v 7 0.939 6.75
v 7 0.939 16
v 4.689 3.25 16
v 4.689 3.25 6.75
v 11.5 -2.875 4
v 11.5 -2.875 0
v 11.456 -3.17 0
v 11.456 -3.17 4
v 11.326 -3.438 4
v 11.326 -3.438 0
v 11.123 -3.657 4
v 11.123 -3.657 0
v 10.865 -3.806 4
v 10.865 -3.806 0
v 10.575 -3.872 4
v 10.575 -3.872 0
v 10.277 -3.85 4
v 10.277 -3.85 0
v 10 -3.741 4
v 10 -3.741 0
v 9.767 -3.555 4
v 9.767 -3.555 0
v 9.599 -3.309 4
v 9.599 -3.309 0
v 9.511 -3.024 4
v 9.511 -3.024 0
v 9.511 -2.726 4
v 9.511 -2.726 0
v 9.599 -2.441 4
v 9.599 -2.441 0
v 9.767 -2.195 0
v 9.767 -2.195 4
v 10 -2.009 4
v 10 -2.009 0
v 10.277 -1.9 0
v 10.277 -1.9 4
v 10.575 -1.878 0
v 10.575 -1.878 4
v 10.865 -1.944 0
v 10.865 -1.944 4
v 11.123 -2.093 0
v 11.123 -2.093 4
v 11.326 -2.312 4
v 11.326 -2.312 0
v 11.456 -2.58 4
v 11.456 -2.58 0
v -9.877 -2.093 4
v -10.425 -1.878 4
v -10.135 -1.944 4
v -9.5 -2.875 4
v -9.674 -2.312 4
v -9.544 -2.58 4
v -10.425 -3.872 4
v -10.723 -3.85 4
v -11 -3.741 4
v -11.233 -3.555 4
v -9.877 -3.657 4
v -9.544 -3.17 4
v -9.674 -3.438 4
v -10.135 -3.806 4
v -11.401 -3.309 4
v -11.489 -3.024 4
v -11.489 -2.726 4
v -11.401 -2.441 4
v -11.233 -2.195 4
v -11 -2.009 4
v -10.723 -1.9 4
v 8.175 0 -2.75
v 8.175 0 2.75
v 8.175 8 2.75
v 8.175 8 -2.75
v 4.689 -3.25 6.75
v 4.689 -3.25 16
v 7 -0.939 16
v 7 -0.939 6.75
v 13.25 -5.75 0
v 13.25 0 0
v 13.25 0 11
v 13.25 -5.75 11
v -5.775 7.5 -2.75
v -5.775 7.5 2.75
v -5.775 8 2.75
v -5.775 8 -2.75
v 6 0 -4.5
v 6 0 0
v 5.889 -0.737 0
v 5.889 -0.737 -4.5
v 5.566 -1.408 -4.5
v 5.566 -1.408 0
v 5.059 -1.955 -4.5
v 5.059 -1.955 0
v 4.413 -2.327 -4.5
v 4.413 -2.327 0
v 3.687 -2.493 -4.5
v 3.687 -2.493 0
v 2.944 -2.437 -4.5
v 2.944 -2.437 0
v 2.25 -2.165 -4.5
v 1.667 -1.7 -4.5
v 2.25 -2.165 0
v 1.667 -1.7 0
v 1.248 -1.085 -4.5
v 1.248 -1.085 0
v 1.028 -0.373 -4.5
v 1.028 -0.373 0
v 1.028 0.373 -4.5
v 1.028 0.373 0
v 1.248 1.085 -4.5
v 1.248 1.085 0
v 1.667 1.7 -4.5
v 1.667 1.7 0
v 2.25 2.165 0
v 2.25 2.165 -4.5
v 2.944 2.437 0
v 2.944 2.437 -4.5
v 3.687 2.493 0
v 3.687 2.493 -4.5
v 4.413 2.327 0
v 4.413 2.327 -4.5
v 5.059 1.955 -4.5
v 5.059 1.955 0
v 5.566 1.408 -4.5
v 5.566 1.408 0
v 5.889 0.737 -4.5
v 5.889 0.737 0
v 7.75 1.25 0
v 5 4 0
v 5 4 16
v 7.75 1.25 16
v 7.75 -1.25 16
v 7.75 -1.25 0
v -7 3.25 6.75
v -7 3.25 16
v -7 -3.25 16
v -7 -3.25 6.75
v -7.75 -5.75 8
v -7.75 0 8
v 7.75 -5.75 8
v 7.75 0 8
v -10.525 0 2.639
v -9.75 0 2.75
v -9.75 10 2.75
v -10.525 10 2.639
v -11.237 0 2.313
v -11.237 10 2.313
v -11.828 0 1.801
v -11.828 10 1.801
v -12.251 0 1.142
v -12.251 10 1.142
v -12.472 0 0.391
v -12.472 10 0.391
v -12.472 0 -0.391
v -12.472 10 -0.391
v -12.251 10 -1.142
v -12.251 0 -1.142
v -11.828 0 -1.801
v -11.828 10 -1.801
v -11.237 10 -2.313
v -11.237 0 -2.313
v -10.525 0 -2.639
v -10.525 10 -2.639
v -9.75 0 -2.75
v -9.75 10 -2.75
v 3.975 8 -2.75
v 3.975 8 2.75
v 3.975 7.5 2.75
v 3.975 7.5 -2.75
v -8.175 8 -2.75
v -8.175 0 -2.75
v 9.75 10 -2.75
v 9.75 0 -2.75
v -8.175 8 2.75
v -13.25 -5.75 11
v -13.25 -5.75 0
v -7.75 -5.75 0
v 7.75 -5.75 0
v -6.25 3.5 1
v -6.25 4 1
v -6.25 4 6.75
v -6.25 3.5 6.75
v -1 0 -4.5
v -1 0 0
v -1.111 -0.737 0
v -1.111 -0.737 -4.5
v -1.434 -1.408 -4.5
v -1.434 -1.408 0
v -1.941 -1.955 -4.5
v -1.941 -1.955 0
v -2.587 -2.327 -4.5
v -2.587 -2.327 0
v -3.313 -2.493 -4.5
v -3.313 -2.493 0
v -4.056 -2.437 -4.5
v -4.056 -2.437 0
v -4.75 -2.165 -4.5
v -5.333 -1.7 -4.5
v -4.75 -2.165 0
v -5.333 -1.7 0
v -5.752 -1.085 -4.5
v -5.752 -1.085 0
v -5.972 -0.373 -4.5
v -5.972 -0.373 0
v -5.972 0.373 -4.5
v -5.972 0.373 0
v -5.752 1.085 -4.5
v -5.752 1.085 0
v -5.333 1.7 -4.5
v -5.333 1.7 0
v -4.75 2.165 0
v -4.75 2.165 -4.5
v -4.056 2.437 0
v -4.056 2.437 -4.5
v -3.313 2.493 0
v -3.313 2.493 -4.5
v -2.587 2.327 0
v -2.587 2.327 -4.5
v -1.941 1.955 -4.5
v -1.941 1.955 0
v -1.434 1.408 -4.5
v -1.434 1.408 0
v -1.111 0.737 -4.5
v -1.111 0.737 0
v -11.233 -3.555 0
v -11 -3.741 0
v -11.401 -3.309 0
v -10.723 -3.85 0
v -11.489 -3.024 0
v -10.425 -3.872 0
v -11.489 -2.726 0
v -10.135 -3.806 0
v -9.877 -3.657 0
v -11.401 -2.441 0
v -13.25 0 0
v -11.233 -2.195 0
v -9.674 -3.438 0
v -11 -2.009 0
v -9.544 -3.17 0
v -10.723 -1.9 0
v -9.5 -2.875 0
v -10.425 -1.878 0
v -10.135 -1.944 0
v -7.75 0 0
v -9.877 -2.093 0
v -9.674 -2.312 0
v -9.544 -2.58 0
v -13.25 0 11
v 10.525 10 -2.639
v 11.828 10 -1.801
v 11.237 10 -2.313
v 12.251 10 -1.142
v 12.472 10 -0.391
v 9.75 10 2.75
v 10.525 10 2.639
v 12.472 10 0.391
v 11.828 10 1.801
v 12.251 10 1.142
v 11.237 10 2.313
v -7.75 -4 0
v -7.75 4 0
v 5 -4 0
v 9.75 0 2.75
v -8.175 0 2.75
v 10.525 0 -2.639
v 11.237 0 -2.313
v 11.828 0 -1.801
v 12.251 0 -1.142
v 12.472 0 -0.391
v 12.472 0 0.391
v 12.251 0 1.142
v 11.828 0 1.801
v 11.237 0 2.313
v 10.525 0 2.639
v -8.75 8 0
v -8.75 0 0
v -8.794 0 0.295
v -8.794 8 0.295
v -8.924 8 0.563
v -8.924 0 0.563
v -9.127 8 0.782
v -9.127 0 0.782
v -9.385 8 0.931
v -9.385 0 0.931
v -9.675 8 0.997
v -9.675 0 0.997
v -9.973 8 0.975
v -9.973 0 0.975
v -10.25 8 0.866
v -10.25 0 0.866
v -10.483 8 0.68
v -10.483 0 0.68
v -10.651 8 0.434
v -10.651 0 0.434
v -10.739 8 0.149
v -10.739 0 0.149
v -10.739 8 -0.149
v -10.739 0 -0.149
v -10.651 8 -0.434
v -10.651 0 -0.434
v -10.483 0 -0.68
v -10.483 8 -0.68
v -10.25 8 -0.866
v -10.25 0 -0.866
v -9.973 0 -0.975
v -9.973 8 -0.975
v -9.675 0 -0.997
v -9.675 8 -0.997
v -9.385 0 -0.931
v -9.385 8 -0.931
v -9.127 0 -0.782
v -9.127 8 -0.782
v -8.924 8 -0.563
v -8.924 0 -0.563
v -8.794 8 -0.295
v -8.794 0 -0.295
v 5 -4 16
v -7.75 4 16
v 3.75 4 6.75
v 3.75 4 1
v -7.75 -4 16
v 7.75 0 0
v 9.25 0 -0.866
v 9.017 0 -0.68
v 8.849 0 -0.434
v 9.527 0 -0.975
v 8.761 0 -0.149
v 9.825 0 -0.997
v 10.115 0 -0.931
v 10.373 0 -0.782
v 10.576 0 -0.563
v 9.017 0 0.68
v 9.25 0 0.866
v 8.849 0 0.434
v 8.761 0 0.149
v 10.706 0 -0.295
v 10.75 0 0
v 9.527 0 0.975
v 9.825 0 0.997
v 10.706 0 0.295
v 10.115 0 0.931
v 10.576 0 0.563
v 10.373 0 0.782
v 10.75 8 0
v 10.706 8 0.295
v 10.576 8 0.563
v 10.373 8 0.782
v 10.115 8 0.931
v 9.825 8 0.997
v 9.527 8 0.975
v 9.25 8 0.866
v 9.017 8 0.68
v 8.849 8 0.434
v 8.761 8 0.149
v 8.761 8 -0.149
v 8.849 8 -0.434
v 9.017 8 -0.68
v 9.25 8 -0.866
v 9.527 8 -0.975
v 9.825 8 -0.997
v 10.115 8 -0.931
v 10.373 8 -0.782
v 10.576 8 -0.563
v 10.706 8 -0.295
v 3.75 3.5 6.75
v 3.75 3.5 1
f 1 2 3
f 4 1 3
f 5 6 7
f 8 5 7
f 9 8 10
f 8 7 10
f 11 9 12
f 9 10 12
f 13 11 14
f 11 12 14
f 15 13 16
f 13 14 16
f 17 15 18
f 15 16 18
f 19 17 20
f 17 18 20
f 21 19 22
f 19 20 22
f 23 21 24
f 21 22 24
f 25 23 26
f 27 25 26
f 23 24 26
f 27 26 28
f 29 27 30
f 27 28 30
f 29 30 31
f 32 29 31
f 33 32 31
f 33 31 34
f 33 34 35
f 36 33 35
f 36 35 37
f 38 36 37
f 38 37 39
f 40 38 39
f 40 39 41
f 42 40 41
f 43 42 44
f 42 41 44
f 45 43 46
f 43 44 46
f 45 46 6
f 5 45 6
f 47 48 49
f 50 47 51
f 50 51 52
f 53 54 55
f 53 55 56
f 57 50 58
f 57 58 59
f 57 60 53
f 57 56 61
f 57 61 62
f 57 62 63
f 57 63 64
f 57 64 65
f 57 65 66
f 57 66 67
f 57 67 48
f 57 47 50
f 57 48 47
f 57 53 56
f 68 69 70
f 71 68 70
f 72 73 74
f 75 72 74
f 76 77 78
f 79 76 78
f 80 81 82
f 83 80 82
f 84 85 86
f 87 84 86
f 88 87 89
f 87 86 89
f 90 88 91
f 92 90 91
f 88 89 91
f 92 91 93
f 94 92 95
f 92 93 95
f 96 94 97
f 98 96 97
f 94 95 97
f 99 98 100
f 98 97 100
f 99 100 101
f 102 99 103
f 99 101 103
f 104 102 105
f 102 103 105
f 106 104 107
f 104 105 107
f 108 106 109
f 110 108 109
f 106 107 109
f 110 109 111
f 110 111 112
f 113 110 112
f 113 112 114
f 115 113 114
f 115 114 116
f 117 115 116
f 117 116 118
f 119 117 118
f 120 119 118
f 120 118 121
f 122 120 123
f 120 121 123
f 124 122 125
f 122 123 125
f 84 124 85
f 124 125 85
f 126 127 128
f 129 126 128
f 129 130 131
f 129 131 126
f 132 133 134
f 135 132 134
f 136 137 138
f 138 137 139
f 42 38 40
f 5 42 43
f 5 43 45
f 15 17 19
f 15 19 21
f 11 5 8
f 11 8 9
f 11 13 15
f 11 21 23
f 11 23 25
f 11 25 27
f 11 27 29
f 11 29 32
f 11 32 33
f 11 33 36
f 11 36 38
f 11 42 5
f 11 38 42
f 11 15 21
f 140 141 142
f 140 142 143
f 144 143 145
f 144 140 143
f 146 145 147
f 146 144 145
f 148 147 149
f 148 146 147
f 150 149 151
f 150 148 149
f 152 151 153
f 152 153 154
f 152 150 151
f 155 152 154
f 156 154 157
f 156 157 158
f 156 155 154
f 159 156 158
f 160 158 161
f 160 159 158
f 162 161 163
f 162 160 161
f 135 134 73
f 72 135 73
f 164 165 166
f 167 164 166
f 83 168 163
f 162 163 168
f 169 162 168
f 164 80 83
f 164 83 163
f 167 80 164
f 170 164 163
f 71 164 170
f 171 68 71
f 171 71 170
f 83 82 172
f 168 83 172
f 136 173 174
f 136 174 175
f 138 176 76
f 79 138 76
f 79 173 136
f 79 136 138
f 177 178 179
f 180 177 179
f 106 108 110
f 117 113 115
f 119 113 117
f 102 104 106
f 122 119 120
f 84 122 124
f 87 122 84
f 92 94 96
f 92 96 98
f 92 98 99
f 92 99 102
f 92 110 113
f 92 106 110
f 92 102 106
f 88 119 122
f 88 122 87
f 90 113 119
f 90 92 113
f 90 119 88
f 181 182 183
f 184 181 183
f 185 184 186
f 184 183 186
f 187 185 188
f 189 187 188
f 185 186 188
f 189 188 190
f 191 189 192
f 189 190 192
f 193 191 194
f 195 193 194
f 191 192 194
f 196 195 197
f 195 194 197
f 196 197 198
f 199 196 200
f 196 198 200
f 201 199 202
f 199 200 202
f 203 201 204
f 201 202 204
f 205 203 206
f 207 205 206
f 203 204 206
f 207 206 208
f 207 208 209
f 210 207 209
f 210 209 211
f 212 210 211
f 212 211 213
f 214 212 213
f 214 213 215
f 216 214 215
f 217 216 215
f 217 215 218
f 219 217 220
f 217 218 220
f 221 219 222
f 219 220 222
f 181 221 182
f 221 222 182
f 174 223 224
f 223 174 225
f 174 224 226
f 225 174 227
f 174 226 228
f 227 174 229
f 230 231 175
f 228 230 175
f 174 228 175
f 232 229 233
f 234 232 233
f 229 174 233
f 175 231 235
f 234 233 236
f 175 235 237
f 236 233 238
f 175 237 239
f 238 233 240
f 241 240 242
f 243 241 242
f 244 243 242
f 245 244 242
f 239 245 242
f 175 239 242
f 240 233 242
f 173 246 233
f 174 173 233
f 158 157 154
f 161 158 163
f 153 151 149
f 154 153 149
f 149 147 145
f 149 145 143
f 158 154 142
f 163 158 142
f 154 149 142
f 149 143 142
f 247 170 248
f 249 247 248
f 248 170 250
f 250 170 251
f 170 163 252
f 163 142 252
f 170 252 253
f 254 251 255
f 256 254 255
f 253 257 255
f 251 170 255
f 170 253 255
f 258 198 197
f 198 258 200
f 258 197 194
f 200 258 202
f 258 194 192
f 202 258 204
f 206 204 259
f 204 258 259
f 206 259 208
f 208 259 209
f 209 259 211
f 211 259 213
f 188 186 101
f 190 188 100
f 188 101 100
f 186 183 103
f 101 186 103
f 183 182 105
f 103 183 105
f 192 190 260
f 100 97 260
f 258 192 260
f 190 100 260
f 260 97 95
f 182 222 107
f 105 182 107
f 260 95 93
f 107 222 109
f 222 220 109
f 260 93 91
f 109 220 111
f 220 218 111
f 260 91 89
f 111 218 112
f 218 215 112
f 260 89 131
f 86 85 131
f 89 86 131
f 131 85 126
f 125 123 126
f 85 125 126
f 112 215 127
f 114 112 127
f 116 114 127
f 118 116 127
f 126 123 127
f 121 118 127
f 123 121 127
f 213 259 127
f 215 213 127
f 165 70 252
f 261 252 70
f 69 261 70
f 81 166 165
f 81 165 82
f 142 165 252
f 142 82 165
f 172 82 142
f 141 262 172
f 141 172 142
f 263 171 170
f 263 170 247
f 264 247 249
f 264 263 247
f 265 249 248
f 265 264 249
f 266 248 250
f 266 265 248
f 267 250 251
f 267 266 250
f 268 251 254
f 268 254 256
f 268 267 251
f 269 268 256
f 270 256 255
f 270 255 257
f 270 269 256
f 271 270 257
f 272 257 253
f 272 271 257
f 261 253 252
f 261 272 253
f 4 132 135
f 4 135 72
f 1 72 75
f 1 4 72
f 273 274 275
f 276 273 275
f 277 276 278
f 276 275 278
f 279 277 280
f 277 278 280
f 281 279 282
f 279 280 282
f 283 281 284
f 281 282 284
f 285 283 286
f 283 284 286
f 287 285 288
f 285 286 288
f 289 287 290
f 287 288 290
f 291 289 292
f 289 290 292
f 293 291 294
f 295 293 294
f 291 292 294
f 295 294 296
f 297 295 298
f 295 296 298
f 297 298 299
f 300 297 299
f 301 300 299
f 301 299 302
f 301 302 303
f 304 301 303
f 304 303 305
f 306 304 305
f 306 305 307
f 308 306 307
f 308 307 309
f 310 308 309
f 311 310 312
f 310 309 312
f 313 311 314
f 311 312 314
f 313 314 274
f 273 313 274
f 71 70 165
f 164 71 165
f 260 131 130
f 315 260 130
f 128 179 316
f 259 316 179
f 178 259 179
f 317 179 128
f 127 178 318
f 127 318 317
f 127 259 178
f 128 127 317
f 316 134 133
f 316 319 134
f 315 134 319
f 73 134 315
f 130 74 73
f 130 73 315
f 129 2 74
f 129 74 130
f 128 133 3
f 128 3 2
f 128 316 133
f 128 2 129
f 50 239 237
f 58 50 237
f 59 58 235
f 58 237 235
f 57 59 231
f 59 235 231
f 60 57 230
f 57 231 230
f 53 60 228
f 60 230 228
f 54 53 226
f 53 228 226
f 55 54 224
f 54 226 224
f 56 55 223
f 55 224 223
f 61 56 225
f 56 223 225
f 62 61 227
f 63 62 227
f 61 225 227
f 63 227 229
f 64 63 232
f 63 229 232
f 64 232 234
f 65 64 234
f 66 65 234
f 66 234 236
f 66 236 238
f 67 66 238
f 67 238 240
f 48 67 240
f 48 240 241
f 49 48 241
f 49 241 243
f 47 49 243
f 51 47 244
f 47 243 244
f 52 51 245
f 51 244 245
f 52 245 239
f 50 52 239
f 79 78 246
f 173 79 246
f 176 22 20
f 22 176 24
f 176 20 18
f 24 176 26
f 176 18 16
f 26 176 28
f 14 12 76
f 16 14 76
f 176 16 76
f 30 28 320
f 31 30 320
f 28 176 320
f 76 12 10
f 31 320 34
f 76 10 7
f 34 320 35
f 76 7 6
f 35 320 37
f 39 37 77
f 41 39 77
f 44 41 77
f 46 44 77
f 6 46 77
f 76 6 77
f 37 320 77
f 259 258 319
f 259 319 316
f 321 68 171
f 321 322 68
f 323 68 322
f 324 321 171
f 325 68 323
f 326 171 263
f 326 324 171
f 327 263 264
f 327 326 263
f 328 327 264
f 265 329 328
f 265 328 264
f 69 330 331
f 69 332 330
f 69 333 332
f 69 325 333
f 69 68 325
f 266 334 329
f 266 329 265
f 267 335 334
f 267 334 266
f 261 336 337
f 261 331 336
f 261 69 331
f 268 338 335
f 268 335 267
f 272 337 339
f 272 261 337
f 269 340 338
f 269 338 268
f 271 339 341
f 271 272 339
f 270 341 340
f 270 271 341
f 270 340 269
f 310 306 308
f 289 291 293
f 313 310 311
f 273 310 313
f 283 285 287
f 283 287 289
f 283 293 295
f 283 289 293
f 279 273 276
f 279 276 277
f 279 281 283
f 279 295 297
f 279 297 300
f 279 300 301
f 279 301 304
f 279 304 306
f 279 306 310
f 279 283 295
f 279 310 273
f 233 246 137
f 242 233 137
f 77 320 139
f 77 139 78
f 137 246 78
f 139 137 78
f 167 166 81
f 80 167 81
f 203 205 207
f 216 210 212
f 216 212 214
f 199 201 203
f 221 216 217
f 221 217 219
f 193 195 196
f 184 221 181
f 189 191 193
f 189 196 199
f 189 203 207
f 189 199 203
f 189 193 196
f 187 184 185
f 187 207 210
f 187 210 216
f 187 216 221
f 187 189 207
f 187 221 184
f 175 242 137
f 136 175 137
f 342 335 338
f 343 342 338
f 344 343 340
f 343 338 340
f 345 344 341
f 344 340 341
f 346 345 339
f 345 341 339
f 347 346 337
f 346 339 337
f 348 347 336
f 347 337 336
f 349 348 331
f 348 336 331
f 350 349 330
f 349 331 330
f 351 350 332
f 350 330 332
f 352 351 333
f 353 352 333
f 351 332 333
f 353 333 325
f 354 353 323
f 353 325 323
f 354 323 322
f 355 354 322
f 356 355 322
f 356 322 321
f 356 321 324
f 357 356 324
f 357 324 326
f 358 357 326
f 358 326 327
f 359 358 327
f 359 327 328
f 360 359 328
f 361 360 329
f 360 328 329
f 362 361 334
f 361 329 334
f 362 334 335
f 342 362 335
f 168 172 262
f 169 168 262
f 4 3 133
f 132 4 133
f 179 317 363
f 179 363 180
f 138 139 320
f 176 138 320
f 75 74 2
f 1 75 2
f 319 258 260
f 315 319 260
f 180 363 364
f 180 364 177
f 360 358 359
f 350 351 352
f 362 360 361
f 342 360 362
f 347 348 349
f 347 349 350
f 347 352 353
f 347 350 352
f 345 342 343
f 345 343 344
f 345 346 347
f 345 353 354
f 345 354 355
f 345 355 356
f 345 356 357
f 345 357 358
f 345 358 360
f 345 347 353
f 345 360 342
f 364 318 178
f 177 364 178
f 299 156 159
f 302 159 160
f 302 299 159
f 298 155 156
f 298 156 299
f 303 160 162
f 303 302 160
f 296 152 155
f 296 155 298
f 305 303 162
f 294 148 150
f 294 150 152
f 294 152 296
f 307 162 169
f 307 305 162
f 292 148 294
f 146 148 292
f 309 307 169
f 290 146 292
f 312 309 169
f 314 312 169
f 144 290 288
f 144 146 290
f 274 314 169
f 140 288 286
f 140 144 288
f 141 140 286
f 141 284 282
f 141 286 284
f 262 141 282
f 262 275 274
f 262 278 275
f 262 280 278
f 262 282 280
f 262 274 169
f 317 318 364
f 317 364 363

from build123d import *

# Parameters (mm, degrees)
F0_W      = 15.5
F0_H      = 8
F1_DEPTH  = 16
F2_SIZE   = 2.75
F4_DEPTH  = 9.25
F5_R      = 2.5
F6_DEPTH  = 4.5
F7_W      = 10
F7_H      = 5.75
F8_DEPTH  = 0.5
F10_DEPTH = 5.75
F11_R     = 1
F12_DEPTH = 4
F14_DEPTH = 10
F16_DEPTH = 12.5
F17_R     = 1
F18_DEPTH = 8


with BuildPart() as f1:
    # F0 (on Top) → F1 (new body)
    with BuildSketch(Plane.XY):
        Rectangle(F0_W, F0_H)
    extrude(amount=F1_DEPTH)

    # F2
    f2_edges = [f1.edges().sort_by_distance(p)[0] for p in [
        (7.75, -4, 8),
        (7.75, 4, 8),
    ]]
    chamfer(f2_edges, length=F2_SIZE)

    # F3 (on face) → F4 (cut)
    with BuildSketch(Plane.XY.offset(16)):
        Polygon((4.6893398282, 3.25), (-7, 3.25), (-7, -3.25), (4.6893398282, -3.25), (7, -0.9393398282), (7, 0.9393398282), align=None)
    extrude(amount=-F4_DEPTH, mode=Mode.SUBTRACT)

    # F5 (on face) → F6 (join)
    with BuildSketch(Plane(origin=(0, 0, 0), x_dir=(1, 0, 0), z_dir=(0, 0, -1))):
        with Locations((-3.5, 0)):
            Circle(F5_R)
        with Locations((3.5, 0)):
            Circle(F5_R)
    extrude(amount=F6_DEPTH)

    # F7 (on face) → F8 (cut)
    with BuildSketch(Plane(origin=(0, 4, 0), x_dir=(-1, 0, 0), z_dir=(0, 1, 0))):
        with Locations((1.25, 3.875)):
            Rectangle(F7_W, F7_H)
    extrude(amount=-F8_DEPTH, mode=Mode.SUBTRACT)


with BuildPart() as f10:
    # F9 (on Front) → F10 (new body)
    with BuildSketch(Plane.XZ):
        Polygon((-7.75, 0), (-7.75, 8), (7.75, 8), (7.75, 0), (13.25, 0), (13.25, 11), (-13.25, 11), (-13.25, 0), align=None)
    extrude(amount=F10_DEPTH)

    # F11 (on face) → F12 (cut)
    with BuildSketch(Plane(origin=(0, 0, 0), x_dir=(1, 0, 0), z_dir=(0, 0, -1))):
        with Locations((-10.5, 2.875)):
            Circle(F11_R)
        with Locations((10.5, 2.875)):
            Circle(F11_R)
    extrude(amount=-F12_DEPTH, mode=Mode.SUBTRACT)


with BuildPart() as f14:
    # F13 (on Front) → F14 (new body)
    with BuildSketch(Plane.XZ):
        with BuildLine():
            Line((-9.75, -2.75), (9.75, -2.75))
            ThreePointArc((9.75, -2.75), (12.5, 0), (9.75, 2.75))
            Line((9.75, 2.75), (-9.75, 2.75))
            ThreePointArc((-9.75, 2.75), (-12.5, 0), (-9.75, -2.75))
        make_face()
    extrude(amount=-F14_DEPTH)

    # F15 (on Top) → F16 (cut, symmetric)
    with BuildSketch(Plane.XY):
        Polygon((-8.175, 8), (-8.175, 0), (8.175, 0), (8.175, 8), (3.975, 8), (3.975, 7.5), (-5.775, 7.5), (-5.775, 8), align=None)
    extrude(amount=F16_DEPTH, both=True, mode=Mode.SUBTRACT)

    # F17 (on face) → F18 (cut)
    with BuildSketch(Plane.XZ):
        with Locations((-9.75, 0)):
            Circle(F17_R)
        with Locations((9.75, 0)):
            Circle(F17_R)
    extrude(amount=-F18_DEPTH, mode=Mode.SUBTRACT)


solid = Compound([f1.part, f10.part, f14.part])
